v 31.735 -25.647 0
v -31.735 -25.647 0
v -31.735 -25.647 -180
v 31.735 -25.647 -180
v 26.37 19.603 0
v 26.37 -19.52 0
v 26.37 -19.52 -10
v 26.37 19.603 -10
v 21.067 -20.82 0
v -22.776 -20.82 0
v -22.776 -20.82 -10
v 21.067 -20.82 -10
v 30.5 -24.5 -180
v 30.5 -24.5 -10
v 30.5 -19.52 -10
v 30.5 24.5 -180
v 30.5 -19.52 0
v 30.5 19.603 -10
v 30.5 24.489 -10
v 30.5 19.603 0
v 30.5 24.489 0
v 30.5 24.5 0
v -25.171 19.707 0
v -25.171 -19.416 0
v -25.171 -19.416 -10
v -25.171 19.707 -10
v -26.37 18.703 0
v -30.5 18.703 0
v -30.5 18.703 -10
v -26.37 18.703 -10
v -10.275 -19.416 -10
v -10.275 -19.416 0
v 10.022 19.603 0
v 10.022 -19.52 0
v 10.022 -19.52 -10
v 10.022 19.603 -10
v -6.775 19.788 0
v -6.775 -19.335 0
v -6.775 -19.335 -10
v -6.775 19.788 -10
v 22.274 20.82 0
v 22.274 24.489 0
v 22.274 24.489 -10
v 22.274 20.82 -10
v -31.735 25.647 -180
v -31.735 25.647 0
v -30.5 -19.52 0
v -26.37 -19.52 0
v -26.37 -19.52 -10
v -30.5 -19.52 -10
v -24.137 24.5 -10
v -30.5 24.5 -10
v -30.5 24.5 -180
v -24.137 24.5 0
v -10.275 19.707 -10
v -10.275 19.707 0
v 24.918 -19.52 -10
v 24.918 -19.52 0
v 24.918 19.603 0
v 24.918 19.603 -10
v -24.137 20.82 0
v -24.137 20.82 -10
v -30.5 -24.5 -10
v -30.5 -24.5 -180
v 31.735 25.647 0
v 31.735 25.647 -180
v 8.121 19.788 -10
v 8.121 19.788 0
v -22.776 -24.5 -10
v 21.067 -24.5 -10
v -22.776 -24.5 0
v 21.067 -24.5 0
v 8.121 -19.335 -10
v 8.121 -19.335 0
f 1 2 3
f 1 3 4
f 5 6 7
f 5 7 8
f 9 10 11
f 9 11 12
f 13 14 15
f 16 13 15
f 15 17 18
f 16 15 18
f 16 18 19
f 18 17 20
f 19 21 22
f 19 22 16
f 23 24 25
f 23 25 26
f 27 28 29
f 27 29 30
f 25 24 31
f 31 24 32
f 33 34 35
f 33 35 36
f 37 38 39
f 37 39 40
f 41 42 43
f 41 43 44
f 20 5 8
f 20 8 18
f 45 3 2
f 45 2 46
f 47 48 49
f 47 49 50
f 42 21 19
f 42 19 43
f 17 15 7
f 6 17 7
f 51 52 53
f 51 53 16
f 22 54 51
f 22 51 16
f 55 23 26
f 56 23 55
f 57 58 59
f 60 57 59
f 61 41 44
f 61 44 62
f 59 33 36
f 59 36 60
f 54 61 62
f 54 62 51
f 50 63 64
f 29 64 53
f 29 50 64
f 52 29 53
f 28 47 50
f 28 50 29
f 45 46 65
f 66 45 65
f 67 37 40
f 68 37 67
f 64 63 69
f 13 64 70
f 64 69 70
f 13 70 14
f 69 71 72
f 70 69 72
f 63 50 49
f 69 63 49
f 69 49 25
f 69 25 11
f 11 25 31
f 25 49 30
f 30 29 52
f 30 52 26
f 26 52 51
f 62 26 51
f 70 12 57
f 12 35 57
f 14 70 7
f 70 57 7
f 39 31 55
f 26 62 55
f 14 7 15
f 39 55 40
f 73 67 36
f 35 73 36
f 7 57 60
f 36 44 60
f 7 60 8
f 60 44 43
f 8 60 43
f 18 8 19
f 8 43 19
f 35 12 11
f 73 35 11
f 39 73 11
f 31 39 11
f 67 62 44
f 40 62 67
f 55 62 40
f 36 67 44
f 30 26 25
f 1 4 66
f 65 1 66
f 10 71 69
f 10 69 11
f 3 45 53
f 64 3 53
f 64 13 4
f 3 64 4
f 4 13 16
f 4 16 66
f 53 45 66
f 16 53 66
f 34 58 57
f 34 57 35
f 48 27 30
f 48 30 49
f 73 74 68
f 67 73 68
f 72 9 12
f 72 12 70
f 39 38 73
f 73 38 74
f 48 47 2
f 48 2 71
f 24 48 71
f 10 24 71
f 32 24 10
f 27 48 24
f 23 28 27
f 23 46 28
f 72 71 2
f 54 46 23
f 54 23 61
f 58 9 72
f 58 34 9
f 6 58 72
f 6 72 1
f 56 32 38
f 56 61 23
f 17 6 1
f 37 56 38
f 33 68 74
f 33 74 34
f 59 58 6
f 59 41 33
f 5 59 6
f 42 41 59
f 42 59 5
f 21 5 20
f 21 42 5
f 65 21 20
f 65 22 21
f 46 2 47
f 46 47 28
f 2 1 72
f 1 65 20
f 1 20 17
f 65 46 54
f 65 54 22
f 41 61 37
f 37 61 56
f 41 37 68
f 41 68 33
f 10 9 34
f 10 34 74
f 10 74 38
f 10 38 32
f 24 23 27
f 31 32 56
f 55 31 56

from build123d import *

# Parameters (mm, degrees)
F0_W     = 63.4695142508
F0_H     = 51.2949377298
F0_W_2   = 61
F0_H_2   = 49
F1_DEPTH = 180
F3_W     = 2.2321660072
F3_H     = 3.732714802
F3_W_2   = 14.8959429935
F3_H_2   = 39.1232501715
F3_W_3   = 3.5938005894
F3_H_3   = 1.2999996543
F3_W_4   = 1.4519924298
F4_DEPTH = 10


# Not quite as in the source:
# - a feature names something its author has since deleted; it is built from what else it names
# - the program builds the solid bodies; features that only make, move or delete a surface that nothing else refers to are left out


with BuildPart() as f1:
    # F0 (on Top) → F1 (new body)
    with BuildSketch(Plane.XY):
        Rectangle(F0_W, F0_H)
        Rectangle(F0_W_2, F0_H_2, mode=Mode.SUBTRACT)
    extrude(amount=-F1_DEPTH)

    # F3 (on Top) → F4 (join)
    with BuildSketch(Plane.XY):
        with Locations((-25.2534588799, 22.6865075529)):
            Rectangle(F3_W, F3_H)
        Polygon((-24.1373758763, 20.8201501518), (-26.3695418835, 20.8201501518), (-26.3695418835, 18.7030434608), (-26.3695418835, -19.5201504976), (-22.775741294, -19.5201504976), (-22.775741294, -20.8201501518), (21.0672114044, -20.8201501518), (21.0672114044, -19.5201504976), (10.0216064602, -19.5201504976), (10.0216064602, 19.603099674), (22.2738981247, 19.603099674), (22.2738981247, 20.8201501518), align=None)
        with Locations((-17.7230439149, 0.1456094906)):
            Rectangle(F3_W_2, F3_H_2, mode=Mode.SUBTRACT)
        with Locations((0.6728977896, 0.226427801)):
            Rectangle(F3_W_2, F3_H_2, mode=Mode.SUBTRACT)
        Polygon((-26.3695418835, 18.7030434608), (-26.3695418835, 20.8201501518), (-26.3695418835, 24.5528649539), (-30.5465664715, 24.5528649539), (-30.5465664715, 18.7030434608), align=None)
        Polygon((22.2738981247, 24.4889948517), (22.2738981247, 20.8201501518), (26.3695418835, 20.8201501518), (26.3695418835, 19.603099674), (30.5195916444, 19.603099674), (30.5195916444, 24.4889948517), align=None)
        Polygon((26.3695418835, 20.8201501518), (22.2738981247, 20.8201501518), (22.2738981247, 19.603099674), (24.9175494537, 19.603099674), (26.3695418835, 19.603099674), align=None)
        with Locations((-24.5726415887, -20.1701503247)):
            Rectangle(F3_W_3, F3_H_3)
        Polygon((-26.3695418835, -20.8201501518), (-26.3695418835, -19.5201504976), (-30.8873578906, -19.5201504976), (-30.8873578906, -24.8510874808), (-22.775741294, -24.8510874808), (-22.775741294, -20.8201501518), align=None)
        with Locations((25.6435456686, 0.0414745882)):
            Rectangle(F3_W_4, F3_H_2)
        Polygon((31.1229377985, -19.5201504976), (26.3695418835, -19.5201504976), (26.3695418835, -20.8201501518), (21.0672114044, -20.8201501518), (21.0672114044, -24.8510874808), (31.1229377985, -24.8510874808), align=None)
        Polygon((26.3695418835, -20.8201501518), (26.3695418835, -19.5201504976), (24.9175494537, -19.5201504976), (21.0672114044, -19.5201504976), (21.0672114044, -20.8201501518), align=None)
    extrude(amount=-F4_DEPTH)


solid = f1.part
